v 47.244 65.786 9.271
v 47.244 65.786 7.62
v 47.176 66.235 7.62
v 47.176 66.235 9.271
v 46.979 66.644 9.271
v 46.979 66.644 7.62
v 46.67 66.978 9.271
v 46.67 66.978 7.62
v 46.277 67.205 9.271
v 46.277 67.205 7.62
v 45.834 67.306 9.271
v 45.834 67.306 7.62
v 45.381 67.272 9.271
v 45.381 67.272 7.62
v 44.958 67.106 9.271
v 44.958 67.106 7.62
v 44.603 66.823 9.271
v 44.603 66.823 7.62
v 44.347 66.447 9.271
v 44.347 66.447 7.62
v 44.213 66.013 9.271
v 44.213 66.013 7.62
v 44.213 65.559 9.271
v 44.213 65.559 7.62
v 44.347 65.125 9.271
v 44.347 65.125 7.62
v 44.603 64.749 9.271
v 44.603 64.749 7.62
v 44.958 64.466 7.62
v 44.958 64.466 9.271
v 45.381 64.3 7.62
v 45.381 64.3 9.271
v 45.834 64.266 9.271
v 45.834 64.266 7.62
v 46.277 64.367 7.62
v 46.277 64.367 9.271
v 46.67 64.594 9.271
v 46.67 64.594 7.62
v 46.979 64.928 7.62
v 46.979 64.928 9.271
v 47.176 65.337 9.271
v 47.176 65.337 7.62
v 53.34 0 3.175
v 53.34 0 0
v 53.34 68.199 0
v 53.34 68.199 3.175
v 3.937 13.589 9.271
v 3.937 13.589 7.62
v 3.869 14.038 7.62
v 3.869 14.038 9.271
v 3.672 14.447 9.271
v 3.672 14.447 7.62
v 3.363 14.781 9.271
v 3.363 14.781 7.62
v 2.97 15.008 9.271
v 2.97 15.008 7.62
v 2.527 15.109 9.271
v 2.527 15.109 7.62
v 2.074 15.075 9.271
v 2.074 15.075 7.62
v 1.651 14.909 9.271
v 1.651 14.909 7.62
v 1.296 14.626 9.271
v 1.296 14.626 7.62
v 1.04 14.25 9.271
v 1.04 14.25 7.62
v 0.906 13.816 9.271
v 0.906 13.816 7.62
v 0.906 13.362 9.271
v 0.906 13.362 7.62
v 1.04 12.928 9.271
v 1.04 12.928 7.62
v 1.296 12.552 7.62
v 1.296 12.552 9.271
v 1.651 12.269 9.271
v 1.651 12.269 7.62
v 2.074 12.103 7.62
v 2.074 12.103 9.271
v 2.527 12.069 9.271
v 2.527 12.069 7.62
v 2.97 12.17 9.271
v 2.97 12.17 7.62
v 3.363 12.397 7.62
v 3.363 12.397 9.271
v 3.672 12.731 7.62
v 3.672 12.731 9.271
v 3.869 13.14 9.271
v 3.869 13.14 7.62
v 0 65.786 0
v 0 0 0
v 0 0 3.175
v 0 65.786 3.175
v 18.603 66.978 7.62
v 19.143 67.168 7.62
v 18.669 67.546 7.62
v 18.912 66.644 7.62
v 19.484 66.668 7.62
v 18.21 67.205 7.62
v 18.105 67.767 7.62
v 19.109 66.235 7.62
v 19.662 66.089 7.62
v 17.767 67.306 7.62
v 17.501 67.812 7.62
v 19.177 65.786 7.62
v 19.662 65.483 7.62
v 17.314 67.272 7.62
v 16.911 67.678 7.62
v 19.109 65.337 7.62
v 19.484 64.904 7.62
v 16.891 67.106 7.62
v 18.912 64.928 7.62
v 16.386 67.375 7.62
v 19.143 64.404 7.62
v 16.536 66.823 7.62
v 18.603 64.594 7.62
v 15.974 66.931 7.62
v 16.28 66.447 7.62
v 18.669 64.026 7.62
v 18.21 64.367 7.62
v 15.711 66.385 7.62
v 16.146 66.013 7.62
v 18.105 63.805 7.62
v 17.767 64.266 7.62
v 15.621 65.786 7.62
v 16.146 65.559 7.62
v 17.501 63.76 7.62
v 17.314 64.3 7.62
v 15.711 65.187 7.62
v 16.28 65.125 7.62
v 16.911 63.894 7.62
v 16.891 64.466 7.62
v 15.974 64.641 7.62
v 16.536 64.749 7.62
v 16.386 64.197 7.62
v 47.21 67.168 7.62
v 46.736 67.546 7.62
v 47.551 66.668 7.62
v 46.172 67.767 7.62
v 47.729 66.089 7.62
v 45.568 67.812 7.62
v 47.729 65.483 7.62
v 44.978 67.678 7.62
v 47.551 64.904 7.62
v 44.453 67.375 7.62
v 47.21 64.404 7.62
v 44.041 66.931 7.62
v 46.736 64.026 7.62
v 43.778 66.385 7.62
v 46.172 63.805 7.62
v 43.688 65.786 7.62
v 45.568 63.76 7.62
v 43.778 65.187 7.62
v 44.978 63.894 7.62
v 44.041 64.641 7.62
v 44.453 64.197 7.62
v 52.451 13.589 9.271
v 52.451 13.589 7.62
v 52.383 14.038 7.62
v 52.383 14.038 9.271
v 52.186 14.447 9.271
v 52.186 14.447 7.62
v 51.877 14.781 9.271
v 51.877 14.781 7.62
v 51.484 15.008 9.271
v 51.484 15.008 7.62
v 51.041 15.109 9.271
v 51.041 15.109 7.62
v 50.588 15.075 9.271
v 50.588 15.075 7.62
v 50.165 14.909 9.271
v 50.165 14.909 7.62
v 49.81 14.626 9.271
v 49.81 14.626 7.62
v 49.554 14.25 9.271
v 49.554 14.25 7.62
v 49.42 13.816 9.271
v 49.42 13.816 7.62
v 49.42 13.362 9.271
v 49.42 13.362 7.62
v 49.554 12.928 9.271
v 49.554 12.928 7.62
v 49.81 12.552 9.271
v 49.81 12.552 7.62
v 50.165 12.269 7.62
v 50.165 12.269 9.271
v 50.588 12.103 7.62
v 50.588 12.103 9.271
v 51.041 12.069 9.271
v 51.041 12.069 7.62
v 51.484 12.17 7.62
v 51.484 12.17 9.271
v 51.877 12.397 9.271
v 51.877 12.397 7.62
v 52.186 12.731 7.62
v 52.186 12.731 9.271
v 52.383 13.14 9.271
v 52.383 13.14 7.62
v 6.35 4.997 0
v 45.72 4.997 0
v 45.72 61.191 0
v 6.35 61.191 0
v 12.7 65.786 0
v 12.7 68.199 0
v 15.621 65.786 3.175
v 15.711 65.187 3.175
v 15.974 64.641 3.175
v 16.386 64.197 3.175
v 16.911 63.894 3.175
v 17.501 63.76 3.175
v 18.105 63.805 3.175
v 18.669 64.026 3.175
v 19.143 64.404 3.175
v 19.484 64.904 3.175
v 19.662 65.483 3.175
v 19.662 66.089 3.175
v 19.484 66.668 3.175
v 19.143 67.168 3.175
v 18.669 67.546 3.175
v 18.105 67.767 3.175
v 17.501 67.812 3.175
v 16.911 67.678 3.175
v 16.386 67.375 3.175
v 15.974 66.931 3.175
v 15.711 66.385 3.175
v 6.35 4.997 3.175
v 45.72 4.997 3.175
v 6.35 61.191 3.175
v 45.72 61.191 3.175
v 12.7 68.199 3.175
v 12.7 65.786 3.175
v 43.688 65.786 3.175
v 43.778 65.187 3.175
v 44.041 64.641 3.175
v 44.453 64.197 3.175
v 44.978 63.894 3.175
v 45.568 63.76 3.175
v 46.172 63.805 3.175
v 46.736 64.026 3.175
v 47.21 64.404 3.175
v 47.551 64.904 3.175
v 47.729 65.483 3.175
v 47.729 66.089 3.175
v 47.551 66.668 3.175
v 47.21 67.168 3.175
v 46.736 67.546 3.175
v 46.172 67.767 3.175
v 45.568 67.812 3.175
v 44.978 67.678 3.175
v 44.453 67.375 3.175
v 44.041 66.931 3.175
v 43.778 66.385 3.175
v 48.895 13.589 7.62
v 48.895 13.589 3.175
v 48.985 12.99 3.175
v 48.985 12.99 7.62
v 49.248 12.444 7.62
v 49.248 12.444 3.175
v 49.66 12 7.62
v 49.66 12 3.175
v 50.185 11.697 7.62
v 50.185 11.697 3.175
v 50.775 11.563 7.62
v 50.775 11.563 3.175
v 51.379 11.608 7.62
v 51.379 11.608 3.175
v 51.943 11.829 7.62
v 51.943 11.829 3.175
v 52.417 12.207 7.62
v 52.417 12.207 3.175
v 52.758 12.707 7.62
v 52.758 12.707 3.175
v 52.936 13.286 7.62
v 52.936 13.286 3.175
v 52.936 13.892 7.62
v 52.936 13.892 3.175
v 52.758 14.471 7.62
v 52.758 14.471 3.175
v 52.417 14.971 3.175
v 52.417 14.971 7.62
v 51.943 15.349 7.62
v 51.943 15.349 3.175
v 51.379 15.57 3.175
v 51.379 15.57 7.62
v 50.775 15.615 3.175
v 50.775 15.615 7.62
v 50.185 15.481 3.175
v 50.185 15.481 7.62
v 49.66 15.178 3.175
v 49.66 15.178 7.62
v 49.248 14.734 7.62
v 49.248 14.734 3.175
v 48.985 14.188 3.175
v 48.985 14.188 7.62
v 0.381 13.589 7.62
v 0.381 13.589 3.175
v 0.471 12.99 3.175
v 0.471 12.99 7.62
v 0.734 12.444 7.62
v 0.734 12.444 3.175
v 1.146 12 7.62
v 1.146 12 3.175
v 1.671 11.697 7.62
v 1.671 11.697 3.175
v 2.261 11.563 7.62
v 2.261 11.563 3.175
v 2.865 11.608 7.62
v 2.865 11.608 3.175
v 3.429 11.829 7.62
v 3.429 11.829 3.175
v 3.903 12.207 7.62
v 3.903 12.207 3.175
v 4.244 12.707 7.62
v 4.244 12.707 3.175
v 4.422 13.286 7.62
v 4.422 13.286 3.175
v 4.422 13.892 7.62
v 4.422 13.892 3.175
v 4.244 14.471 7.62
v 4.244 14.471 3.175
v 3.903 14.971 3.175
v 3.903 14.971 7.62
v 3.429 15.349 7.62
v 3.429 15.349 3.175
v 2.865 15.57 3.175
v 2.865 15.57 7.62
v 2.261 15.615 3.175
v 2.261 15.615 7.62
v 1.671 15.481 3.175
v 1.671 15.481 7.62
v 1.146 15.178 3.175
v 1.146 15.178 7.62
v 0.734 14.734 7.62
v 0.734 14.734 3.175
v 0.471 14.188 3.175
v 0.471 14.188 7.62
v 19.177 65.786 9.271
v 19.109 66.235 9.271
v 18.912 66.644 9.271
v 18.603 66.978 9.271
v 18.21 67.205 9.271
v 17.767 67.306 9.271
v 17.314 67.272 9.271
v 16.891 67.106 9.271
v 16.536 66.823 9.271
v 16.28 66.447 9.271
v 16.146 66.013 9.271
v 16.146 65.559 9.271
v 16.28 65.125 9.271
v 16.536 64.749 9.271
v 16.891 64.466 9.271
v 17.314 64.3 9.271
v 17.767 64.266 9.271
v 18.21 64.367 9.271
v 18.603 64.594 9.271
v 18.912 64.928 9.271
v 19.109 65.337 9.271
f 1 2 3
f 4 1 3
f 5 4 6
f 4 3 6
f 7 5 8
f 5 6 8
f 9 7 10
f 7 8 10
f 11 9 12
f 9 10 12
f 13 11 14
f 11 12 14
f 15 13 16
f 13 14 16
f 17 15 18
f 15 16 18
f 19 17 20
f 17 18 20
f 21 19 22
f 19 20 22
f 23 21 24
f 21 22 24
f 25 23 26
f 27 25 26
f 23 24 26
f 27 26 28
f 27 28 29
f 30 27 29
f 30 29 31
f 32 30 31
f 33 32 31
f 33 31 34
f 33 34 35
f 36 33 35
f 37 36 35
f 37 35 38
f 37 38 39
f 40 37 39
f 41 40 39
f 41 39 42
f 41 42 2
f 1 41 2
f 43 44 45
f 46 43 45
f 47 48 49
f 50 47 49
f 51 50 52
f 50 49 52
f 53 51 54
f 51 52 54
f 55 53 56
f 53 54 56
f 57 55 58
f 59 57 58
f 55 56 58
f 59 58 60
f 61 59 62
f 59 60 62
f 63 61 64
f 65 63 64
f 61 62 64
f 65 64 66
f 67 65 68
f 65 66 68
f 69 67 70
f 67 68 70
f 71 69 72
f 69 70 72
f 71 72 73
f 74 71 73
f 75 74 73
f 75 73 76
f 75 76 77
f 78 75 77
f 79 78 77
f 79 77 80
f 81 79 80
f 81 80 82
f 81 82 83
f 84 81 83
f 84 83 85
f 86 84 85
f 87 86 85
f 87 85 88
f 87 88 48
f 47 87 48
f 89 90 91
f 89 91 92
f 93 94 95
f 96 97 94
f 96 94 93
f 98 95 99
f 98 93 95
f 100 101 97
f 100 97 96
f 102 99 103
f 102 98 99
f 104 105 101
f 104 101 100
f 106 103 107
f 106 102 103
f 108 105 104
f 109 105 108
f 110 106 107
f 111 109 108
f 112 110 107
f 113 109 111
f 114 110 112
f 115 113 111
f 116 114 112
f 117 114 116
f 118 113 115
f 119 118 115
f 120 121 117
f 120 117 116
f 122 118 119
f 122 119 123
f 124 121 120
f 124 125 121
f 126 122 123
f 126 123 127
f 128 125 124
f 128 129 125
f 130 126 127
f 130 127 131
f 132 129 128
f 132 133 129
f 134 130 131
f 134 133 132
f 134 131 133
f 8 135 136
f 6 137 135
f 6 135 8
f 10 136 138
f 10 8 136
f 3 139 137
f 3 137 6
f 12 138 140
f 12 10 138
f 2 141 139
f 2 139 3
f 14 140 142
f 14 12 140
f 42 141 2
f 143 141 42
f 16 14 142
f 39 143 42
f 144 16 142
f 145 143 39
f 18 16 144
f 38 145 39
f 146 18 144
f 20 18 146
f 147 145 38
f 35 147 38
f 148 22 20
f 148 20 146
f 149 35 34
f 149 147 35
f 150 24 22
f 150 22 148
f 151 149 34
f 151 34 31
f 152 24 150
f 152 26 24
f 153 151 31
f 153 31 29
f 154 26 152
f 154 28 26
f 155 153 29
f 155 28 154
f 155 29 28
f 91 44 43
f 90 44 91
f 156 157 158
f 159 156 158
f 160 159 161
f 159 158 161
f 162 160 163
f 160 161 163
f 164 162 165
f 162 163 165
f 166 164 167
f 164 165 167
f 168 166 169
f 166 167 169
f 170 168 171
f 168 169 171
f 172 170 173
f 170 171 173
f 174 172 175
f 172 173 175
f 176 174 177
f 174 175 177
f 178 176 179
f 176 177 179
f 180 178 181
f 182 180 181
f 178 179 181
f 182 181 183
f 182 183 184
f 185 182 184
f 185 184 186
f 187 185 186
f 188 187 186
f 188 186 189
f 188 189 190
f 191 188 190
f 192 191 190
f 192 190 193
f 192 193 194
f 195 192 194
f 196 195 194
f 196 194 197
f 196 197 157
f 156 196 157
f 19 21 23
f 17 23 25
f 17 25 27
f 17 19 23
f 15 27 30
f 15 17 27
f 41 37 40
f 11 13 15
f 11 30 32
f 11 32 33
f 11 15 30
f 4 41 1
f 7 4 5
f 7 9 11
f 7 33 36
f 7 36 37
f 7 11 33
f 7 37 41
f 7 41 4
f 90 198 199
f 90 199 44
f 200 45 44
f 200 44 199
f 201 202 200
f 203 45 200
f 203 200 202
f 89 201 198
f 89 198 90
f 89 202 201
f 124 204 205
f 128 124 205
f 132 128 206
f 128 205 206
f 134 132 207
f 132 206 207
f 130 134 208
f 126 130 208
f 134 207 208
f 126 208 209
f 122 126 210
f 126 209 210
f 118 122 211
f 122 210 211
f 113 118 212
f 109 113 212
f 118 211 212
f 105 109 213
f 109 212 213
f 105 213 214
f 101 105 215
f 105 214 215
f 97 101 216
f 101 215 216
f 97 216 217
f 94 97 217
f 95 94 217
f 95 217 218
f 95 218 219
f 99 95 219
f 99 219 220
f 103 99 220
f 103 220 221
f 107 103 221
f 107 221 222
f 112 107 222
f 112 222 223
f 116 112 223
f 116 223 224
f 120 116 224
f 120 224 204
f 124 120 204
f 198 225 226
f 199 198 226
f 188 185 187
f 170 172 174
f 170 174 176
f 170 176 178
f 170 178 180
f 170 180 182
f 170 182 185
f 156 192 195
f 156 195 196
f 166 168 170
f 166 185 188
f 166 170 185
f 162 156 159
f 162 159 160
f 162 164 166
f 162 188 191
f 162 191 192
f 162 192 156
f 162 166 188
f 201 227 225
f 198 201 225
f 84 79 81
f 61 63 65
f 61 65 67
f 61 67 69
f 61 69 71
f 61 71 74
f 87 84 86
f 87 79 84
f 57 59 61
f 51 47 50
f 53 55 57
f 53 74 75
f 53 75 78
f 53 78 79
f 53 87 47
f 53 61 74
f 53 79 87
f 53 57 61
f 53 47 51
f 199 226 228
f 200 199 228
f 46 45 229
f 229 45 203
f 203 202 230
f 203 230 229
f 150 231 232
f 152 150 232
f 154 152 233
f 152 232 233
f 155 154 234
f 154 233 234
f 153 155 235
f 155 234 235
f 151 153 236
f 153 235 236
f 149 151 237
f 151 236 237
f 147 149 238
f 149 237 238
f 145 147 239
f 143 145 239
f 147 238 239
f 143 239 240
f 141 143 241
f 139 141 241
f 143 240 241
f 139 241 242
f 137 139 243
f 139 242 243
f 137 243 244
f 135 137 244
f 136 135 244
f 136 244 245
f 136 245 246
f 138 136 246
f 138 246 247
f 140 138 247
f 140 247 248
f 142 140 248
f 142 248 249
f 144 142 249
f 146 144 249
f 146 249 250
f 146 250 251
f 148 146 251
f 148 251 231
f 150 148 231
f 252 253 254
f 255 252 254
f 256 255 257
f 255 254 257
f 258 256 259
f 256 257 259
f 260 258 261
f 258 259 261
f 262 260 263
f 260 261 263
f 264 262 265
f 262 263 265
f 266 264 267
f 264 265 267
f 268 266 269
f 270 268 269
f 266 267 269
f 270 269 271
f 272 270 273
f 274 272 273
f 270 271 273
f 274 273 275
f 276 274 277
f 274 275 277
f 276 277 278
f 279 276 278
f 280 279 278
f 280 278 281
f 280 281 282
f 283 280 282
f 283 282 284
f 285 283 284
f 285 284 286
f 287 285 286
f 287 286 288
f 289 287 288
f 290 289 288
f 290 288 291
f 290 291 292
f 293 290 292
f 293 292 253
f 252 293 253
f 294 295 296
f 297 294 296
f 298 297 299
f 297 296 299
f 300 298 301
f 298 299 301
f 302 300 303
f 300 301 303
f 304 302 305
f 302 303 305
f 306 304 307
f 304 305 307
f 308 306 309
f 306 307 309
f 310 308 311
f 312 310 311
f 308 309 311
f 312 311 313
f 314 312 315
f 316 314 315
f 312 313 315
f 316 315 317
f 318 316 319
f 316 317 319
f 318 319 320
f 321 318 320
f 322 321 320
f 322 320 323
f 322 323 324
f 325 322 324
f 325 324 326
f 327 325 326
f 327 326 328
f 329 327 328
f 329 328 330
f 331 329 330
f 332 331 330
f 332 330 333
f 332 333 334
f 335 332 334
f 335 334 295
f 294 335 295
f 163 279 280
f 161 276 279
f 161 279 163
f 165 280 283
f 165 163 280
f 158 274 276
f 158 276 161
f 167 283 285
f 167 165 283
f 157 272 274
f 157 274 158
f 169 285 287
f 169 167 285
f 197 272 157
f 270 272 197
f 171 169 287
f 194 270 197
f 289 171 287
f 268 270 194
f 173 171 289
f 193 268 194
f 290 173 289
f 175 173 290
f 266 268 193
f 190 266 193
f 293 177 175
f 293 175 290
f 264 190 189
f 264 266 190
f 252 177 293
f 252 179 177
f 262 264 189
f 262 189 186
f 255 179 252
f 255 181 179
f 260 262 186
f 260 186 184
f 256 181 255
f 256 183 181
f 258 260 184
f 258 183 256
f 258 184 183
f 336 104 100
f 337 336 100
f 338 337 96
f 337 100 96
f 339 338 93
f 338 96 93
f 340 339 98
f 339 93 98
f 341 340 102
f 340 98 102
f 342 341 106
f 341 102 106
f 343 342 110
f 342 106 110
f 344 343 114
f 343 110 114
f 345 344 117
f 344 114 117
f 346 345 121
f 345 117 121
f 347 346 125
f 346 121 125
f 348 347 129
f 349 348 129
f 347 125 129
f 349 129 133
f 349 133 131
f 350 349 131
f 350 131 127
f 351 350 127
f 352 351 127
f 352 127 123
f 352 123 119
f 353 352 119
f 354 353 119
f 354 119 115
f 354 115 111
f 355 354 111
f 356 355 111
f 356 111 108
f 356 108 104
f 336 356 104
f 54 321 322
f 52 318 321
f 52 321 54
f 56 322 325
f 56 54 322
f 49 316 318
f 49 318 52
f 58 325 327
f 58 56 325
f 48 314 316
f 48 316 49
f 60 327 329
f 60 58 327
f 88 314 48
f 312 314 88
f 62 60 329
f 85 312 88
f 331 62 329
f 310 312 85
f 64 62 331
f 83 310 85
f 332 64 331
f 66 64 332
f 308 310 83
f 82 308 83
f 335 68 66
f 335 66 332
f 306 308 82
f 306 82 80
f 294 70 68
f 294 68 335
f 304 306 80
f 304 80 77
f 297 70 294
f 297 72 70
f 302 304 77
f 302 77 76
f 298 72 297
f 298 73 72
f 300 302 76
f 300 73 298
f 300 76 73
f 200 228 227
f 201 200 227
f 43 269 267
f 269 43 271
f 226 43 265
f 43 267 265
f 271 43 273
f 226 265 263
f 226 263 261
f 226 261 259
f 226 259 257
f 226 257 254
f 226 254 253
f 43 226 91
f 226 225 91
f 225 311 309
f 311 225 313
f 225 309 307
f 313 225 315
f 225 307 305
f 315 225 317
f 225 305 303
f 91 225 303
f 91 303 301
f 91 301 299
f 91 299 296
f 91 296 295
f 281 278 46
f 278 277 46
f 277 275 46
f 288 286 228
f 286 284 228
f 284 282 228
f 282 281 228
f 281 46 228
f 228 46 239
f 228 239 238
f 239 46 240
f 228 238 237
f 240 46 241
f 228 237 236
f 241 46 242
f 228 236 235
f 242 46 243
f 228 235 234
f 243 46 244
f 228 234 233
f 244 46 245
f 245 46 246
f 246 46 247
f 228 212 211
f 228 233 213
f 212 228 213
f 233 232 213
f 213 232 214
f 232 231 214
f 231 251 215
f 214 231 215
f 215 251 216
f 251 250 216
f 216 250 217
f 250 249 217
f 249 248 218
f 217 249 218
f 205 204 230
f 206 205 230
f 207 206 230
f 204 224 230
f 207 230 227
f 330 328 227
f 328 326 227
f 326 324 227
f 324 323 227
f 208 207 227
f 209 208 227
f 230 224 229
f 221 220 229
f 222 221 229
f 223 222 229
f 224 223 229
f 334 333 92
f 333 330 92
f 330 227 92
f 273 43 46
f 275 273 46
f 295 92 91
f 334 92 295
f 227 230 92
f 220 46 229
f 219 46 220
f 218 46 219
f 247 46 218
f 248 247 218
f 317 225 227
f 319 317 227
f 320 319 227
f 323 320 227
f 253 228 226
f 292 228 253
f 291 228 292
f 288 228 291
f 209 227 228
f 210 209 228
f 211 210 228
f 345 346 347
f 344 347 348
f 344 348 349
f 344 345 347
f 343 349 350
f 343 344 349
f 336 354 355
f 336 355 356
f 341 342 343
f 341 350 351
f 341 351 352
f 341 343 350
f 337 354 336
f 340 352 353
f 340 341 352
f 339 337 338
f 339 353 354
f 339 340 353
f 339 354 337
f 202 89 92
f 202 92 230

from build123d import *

# Parameters (mm, degrees)
SKETCH1_R           = 2.032
SKETCH1_W           = 33.02
SKETCH1_H           = 52.3843179
BOSS_EXTRUDE1_DEPTH = 3.175
SKETCH1_3_R         = 2.032
SKETCH1_3_R_2       = 1.524
BOSS_EXTRUDE2_DEPTH = 7.62
SKETCH1_4_R         = 1.524
BOSS_EXTRUDE3_DEPTH = 9.271
SKETCH2_W           = 6.35
SKETCH2_H           = 52.3843179
CUT_EXTRUDE1_DEPTH  = 9.271


with BuildPart() as part:
    # Sketch1 → Boss-Extrude1 (new body)
    with BuildSketch(Plane.XY):
        Polygon((53.34, 68.199), (53.34, 65.786), (53.34, 0), (0, 0), (0, 65.786), (12.7, 65.786), (12.7, 68.199), (45.72, 68.199), align=None)
        with Locations((45.72, 65.786)):
            Circle(SKETCH1_R, mode=Mode.SUBTRACT)
        with Locations((17.653, 65.786)):
            Circle(SKETCH1_R, mode=Mode.SUBTRACT)
        with Locations((2.413, 13.589)):
            Circle(SKETCH1_R, mode=Mode.SUBTRACT)
        with Locations((50.927, 13.589)):
            Circle(SKETCH1_R, mode=Mode.SUBTRACT)
        with Locations((29.21, 31.18869335)):
            Rectangle(SKETCH1_W, SKETCH1_H, mode=Mode.SUBTRACT)
    extrude(amount=BOSS_EXTRUDE1_DEPTH)

    # Sketch1<3> → Boss-Extrude2 (add)
    # profile 1 of 4: a face of its own
    with BuildSketch(Plane.XY):
        with Locations(Location((17.653, 65.786, 0), (0, 0, 180))):
            Circle(SKETCH1_3_R)
        with Locations(Location((17.653, 65.786, 0), (0, 0, 180))):
            Circle(SKETCH1_3_R_2, mode=Mode.SUBTRACT)
    # profile 2 of 4: a face of its own
    with BuildSketch(Plane.XY):
        with Locations(Location((45.72, 65.786, 0), (0, 0, 180))):
            Circle(SKETCH1_3_R)
        with Locations(Location((45.72, 65.786, 0), (0, 0, 180))):
            Circle(SKETCH1_3_R_2, mode=Mode.SUBTRACT)
    # profile 3 of 4: a face of its own
    with BuildSketch(Plane.XY):
        with Locations(Location((50.927, 13.589, 0), (0, 0, 180))):
            Circle(SKETCH1_3_R)
        with Locations(Location((50.927, 13.589, 0), (0, 0, 180))):
            Circle(SKETCH1_3_R_2, mode=Mode.SUBTRACT)
    # profile 4 of 4: a face of its own
    with BuildSketch(Plane.XY):
        with Locations(Location((2.413, 13.589, 0), (0, 0, 180))):
            Circle(SKETCH1_3_R)
        with Locations(Location((2.413, 13.589, 0), (0, 0, 180))):
            Circle(SKETCH1_3_R_2, mode=Mode.SUBTRACT)
    extrude(amount=BOSS_EXTRUDE2_DEPTH)

    # Sketch1<4> → Boss-Extrude3 (add)
    with BuildSketch(Plane.XY):
        with Locations((2.413, 13.589)):
            Circle(SKETCH1_4_R)
        with Locations((17.653, 65.786)):
            Circle(SKETCH1_4_R)
        with Locations((45.72, 65.786)):
            Circle(SKETCH1_4_R)
        with Locations((50.927, 13.589)):
            Circle(SKETCH1_4_R)
    extrude(amount=BOSS_EXTRUDE3_DEPTH)

    # Sketch2 → Cut-Extrude1 (cut)
    with BuildSketch(Plane.XY.offset(3.175)):
        with Locations((9.525, 31.18869335)):
            Rectangle(SKETCH2_W, SKETCH2_H)
        Polygon((45.72, 57.3808523), (45.72, 61.1908523), (6.35, 61.1908523), (6.35, 57.3808523), (12.7, 57.3808523), align=None)
    extrude(amount=-CUT_EXTRUDE1_DEPTH, mode=Mode.SUBTRACT)


solid = part.part
